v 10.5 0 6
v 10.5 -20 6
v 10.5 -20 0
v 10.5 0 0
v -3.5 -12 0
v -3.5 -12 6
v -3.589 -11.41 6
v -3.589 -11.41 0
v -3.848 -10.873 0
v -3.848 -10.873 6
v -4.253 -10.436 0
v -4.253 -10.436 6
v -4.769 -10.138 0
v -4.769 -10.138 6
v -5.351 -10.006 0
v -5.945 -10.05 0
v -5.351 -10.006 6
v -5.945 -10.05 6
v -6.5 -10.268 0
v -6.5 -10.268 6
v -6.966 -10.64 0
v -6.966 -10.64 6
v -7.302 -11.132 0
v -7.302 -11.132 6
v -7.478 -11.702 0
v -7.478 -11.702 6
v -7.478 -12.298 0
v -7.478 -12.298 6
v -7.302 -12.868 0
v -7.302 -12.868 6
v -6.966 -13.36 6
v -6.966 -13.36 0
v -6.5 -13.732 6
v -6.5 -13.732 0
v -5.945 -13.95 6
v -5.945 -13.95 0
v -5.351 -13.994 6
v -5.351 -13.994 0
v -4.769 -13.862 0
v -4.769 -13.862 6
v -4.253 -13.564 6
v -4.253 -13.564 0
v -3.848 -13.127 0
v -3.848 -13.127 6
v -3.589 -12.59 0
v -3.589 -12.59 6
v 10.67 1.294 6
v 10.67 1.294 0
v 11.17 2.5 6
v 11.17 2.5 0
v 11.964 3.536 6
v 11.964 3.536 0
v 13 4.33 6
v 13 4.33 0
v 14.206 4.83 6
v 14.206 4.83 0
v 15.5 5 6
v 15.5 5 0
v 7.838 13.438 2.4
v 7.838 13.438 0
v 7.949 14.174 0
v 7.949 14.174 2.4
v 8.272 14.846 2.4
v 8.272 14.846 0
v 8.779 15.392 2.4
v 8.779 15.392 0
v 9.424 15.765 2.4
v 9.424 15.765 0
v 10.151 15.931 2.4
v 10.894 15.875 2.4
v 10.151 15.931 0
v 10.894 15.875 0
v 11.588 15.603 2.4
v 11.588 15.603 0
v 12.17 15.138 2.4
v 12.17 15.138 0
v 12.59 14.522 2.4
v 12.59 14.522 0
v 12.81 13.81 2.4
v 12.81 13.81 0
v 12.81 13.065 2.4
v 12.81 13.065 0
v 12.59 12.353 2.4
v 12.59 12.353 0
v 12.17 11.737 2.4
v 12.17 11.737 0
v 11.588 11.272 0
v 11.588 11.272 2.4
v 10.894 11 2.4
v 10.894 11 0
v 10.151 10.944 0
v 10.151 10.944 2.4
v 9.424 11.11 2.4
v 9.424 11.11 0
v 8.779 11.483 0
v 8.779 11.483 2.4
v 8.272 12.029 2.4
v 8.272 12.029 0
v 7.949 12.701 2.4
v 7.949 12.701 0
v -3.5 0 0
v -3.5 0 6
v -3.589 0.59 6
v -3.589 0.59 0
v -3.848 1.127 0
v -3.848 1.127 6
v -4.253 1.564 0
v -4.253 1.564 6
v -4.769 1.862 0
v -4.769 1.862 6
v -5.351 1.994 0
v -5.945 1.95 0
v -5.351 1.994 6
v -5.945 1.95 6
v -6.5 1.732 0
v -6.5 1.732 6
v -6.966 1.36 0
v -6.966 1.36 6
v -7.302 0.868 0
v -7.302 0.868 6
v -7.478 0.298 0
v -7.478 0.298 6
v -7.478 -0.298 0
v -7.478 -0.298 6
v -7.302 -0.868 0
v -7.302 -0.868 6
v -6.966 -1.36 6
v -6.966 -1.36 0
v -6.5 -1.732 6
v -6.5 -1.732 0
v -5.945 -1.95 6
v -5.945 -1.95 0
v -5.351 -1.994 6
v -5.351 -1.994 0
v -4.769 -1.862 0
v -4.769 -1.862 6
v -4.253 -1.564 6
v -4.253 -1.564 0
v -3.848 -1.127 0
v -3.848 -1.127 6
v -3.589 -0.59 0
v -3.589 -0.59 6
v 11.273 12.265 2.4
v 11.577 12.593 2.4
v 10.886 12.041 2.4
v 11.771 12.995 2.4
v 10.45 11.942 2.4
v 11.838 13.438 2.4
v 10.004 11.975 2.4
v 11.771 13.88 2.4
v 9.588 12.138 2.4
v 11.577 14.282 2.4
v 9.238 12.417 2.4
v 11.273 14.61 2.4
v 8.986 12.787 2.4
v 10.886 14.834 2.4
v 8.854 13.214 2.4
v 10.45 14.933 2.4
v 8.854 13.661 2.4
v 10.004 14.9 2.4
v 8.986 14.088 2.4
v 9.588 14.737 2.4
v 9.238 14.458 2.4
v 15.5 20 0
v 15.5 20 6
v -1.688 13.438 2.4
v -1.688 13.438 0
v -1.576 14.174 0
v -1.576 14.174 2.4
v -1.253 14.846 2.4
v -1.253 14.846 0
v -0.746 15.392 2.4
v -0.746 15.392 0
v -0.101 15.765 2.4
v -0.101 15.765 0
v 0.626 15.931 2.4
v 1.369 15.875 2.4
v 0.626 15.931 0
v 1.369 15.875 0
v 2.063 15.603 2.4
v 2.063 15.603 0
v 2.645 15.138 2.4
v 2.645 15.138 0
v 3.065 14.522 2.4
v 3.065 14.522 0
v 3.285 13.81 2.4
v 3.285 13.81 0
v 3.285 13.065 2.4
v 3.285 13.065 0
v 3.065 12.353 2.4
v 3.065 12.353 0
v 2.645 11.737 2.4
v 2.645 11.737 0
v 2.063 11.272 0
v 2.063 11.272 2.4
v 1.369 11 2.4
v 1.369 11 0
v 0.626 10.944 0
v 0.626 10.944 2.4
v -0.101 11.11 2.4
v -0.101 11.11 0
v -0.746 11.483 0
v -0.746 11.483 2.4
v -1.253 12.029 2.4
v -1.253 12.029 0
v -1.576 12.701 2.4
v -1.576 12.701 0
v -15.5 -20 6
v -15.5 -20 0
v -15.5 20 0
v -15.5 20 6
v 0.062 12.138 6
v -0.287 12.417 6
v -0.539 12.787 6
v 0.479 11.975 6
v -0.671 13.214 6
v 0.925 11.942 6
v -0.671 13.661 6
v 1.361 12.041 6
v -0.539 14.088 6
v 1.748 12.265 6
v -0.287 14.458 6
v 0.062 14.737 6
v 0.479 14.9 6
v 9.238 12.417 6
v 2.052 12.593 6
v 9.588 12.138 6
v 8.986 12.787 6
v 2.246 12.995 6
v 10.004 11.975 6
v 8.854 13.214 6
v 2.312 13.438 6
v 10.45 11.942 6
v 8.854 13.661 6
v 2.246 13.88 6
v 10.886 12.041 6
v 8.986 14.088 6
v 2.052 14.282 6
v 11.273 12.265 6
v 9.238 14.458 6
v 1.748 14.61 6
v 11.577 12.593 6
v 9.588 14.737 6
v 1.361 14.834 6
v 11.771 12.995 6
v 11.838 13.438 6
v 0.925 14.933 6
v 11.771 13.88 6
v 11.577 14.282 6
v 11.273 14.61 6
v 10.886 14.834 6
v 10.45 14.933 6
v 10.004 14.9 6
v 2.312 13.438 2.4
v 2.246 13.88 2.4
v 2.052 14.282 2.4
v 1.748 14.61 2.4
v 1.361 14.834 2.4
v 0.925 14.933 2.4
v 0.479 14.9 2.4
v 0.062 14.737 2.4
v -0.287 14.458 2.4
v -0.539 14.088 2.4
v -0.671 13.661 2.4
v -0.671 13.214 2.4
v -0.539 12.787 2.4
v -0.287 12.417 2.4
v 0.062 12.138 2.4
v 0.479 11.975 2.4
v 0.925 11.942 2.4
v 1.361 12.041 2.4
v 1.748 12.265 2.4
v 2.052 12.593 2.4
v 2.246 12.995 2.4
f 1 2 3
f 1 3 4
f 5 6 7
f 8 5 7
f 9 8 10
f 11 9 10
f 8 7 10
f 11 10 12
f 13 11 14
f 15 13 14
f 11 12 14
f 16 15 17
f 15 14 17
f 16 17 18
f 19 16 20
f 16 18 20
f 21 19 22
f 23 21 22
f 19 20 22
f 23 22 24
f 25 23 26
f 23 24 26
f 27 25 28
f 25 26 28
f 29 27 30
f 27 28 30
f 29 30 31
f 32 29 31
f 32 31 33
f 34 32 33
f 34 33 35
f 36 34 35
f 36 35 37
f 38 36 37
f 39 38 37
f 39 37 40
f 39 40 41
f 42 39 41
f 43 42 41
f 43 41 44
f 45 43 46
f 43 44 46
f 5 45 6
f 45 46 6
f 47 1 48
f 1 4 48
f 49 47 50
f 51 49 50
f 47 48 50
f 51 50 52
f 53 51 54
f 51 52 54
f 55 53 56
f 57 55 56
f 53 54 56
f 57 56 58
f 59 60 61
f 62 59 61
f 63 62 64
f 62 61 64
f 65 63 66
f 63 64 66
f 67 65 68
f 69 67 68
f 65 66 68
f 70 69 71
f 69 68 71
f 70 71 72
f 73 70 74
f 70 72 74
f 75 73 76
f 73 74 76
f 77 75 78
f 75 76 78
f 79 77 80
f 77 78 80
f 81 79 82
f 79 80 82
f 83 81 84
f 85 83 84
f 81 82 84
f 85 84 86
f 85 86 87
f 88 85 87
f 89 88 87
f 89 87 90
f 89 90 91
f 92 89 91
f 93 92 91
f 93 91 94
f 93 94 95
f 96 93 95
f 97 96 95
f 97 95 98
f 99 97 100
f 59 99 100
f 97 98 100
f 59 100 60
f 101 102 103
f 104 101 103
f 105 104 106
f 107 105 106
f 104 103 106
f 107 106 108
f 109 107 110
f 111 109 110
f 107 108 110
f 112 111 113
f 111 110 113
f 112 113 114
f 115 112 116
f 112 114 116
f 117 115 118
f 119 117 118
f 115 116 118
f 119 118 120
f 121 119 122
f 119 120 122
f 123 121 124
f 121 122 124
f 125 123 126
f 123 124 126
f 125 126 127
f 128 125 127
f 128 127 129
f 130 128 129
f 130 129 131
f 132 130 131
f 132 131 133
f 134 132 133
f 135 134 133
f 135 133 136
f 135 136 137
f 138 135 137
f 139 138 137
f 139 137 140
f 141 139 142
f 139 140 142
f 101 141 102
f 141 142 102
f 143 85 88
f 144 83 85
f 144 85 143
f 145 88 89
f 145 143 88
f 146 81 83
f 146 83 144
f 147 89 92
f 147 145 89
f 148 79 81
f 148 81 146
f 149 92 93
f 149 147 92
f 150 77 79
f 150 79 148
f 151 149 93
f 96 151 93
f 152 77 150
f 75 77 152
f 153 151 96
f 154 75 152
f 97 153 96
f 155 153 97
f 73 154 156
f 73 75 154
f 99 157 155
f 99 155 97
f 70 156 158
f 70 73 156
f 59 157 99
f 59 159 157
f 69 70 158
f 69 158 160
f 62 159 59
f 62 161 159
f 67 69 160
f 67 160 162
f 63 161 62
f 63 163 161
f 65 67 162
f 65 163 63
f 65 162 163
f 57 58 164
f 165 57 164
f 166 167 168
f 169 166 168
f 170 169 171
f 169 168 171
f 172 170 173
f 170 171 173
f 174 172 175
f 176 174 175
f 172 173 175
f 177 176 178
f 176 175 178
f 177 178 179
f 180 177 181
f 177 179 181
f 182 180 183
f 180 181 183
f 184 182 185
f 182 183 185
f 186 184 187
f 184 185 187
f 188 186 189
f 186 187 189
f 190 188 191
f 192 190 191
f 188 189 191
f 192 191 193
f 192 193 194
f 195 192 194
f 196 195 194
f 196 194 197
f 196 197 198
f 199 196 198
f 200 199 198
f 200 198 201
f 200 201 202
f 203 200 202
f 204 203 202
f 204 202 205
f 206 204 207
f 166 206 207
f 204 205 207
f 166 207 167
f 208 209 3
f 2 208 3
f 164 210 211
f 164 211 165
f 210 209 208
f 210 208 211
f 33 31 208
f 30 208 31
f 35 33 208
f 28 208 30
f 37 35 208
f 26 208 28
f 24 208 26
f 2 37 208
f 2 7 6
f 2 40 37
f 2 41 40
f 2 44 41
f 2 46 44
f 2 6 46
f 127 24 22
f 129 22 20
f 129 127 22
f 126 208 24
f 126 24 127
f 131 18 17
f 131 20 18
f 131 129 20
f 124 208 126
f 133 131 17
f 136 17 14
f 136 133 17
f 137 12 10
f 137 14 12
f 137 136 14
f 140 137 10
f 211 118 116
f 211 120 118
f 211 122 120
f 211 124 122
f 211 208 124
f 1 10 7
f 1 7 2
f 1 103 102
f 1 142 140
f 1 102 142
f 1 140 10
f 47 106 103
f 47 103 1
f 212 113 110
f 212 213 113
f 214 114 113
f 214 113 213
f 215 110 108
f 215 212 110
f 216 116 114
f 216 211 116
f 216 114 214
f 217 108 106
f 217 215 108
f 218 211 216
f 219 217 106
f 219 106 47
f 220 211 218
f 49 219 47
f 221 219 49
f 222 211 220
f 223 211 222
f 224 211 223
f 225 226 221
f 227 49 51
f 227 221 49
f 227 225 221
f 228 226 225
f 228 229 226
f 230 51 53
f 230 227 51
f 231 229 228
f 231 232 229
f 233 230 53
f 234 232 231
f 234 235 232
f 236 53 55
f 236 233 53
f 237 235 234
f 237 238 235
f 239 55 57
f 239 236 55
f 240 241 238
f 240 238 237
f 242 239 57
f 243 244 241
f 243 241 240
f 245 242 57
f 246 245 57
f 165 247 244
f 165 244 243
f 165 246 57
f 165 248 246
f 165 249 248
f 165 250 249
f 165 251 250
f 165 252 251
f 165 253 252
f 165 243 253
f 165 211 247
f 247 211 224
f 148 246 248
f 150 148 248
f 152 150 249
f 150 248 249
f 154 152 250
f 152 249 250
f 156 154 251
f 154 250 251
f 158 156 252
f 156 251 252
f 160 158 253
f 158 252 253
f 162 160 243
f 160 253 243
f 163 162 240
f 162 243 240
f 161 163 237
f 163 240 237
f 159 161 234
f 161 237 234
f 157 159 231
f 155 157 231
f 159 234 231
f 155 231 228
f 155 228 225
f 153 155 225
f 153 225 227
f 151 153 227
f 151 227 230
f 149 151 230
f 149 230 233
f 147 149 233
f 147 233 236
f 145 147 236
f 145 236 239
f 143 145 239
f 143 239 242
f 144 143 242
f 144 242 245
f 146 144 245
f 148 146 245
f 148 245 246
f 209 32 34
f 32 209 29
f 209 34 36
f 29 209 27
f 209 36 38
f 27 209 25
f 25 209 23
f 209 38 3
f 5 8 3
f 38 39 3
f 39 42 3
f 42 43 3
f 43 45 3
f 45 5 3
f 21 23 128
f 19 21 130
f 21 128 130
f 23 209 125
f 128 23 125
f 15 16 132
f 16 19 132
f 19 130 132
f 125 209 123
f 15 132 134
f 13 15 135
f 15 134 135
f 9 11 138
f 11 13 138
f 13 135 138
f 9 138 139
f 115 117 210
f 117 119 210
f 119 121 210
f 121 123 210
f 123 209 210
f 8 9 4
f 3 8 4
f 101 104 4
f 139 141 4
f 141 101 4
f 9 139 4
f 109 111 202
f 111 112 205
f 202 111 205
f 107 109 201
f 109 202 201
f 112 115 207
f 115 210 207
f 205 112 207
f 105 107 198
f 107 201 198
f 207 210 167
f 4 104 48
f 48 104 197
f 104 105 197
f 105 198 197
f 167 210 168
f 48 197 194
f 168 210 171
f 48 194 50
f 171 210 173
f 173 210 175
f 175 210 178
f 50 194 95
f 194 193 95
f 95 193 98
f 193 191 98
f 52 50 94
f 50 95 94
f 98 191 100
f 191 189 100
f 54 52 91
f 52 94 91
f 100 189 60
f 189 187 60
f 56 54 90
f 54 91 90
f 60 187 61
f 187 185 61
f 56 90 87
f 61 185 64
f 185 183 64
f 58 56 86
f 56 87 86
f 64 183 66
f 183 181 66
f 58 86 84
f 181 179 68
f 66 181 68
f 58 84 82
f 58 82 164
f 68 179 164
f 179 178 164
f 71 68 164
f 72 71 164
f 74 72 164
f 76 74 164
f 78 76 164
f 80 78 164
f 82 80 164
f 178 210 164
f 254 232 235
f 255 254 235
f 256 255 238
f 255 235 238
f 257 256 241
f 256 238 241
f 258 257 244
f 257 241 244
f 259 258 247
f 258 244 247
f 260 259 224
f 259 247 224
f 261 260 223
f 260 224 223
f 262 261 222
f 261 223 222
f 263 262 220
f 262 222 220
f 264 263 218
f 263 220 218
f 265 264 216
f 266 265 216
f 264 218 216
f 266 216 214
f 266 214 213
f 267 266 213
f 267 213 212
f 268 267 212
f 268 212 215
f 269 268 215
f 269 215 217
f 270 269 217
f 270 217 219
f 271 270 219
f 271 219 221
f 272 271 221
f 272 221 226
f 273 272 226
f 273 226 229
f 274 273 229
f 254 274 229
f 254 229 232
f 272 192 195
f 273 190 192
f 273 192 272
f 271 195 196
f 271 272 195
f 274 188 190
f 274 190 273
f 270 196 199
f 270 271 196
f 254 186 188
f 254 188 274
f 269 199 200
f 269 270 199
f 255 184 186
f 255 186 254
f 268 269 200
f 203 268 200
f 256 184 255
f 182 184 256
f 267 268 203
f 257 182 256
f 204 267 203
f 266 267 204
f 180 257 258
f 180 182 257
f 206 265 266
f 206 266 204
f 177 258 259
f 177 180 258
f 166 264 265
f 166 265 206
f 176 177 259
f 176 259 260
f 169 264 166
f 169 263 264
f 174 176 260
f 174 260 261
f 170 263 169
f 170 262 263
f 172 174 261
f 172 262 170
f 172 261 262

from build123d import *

# Parameters (mm, degrees)
ESBO_O1_W                = 31
ESBO_O1_H                = 40
RESSALTO_EXTRUS_O1_DEPTH = 6
ESBO_O2_R                = 2
ESBO_O2_W                = 5
ESBO_O2_H                = 25
CORTE_EXTRUS_O1_DEPTH    = 6
ESBO_O4_R                = 1.5
CORTE_EXTRUS_O2_DEPTH    = 6
ESBO_O5_R                = 2.5
CORTE_EXTRUS_O3_DEPTH    = 2.4
FILETE1_R                = 5


with BuildPart() as part:
    # Esboço1 → Ressalto-extrusão1 (new body)
    with BuildSketch(Plane.XY):
        Rectangle(ESBO_O1_W, ESBO_O1_H)
    extrude(amount=RESSALTO_EXTRUS_O1_DEPTH)

    # Esboço2 → Corte-extrusão1 (cut)
    with BuildSketch(Plane.XY.offset(6)):
        with Locations((-5.5, -12)):
            Circle(ESBO_O2_R)
        with Locations((-5.5, 0)):
            Circle(ESBO_O2_R)
        with Locations((13, -7.5)):
            Rectangle(ESBO_O2_W, ESBO_O2_H)
    extrude(amount=-CORTE_EXTRUS_O1_DEPTH, mode=Mode.SUBTRACT)

    # Esboço4 → Corte-extrusão2 (cut)
    with BuildSketch(Plane.XY.offset(6)):
        with Locations((0.8125, 13.4375)):
            Circle(ESBO_O4_R)
        with Locations((10.3375, 13.4375)):
            Circle(ESBO_O4_R)
    extrude(amount=-CORTE_EXTRUS_O2_DEPTH, mode=Mode.SUBTRACT)

    # Esboço5 → Corte-extrusão3 (cut)
    with BuildSketch(Plane(origin=(0, 0, 0), x_dir=(-1, 0, 0), z_dir=(0, 0, -1))):
        with Locations((-0.8125, 13.4375)):
            Circle(ESBO_O5_R)
        with Locations((-10.3375, 13.4375)):
            Circle(ESBO_O5_R)
    extrude(amount=-CORTE_EXTRUS_O3_DEPTH, mode=Mode.SUBTRACT)

    # Filete1
    filete1_edges = [part.edges().sort_by_distance(p)[0] for p in [
        (10.5, 5, 3),
    ]]
    fillet(filete1_edges, radius=FILETE1_R - 0.0001)  # a hair under: the kernel refuses the full size


solid = part.part
